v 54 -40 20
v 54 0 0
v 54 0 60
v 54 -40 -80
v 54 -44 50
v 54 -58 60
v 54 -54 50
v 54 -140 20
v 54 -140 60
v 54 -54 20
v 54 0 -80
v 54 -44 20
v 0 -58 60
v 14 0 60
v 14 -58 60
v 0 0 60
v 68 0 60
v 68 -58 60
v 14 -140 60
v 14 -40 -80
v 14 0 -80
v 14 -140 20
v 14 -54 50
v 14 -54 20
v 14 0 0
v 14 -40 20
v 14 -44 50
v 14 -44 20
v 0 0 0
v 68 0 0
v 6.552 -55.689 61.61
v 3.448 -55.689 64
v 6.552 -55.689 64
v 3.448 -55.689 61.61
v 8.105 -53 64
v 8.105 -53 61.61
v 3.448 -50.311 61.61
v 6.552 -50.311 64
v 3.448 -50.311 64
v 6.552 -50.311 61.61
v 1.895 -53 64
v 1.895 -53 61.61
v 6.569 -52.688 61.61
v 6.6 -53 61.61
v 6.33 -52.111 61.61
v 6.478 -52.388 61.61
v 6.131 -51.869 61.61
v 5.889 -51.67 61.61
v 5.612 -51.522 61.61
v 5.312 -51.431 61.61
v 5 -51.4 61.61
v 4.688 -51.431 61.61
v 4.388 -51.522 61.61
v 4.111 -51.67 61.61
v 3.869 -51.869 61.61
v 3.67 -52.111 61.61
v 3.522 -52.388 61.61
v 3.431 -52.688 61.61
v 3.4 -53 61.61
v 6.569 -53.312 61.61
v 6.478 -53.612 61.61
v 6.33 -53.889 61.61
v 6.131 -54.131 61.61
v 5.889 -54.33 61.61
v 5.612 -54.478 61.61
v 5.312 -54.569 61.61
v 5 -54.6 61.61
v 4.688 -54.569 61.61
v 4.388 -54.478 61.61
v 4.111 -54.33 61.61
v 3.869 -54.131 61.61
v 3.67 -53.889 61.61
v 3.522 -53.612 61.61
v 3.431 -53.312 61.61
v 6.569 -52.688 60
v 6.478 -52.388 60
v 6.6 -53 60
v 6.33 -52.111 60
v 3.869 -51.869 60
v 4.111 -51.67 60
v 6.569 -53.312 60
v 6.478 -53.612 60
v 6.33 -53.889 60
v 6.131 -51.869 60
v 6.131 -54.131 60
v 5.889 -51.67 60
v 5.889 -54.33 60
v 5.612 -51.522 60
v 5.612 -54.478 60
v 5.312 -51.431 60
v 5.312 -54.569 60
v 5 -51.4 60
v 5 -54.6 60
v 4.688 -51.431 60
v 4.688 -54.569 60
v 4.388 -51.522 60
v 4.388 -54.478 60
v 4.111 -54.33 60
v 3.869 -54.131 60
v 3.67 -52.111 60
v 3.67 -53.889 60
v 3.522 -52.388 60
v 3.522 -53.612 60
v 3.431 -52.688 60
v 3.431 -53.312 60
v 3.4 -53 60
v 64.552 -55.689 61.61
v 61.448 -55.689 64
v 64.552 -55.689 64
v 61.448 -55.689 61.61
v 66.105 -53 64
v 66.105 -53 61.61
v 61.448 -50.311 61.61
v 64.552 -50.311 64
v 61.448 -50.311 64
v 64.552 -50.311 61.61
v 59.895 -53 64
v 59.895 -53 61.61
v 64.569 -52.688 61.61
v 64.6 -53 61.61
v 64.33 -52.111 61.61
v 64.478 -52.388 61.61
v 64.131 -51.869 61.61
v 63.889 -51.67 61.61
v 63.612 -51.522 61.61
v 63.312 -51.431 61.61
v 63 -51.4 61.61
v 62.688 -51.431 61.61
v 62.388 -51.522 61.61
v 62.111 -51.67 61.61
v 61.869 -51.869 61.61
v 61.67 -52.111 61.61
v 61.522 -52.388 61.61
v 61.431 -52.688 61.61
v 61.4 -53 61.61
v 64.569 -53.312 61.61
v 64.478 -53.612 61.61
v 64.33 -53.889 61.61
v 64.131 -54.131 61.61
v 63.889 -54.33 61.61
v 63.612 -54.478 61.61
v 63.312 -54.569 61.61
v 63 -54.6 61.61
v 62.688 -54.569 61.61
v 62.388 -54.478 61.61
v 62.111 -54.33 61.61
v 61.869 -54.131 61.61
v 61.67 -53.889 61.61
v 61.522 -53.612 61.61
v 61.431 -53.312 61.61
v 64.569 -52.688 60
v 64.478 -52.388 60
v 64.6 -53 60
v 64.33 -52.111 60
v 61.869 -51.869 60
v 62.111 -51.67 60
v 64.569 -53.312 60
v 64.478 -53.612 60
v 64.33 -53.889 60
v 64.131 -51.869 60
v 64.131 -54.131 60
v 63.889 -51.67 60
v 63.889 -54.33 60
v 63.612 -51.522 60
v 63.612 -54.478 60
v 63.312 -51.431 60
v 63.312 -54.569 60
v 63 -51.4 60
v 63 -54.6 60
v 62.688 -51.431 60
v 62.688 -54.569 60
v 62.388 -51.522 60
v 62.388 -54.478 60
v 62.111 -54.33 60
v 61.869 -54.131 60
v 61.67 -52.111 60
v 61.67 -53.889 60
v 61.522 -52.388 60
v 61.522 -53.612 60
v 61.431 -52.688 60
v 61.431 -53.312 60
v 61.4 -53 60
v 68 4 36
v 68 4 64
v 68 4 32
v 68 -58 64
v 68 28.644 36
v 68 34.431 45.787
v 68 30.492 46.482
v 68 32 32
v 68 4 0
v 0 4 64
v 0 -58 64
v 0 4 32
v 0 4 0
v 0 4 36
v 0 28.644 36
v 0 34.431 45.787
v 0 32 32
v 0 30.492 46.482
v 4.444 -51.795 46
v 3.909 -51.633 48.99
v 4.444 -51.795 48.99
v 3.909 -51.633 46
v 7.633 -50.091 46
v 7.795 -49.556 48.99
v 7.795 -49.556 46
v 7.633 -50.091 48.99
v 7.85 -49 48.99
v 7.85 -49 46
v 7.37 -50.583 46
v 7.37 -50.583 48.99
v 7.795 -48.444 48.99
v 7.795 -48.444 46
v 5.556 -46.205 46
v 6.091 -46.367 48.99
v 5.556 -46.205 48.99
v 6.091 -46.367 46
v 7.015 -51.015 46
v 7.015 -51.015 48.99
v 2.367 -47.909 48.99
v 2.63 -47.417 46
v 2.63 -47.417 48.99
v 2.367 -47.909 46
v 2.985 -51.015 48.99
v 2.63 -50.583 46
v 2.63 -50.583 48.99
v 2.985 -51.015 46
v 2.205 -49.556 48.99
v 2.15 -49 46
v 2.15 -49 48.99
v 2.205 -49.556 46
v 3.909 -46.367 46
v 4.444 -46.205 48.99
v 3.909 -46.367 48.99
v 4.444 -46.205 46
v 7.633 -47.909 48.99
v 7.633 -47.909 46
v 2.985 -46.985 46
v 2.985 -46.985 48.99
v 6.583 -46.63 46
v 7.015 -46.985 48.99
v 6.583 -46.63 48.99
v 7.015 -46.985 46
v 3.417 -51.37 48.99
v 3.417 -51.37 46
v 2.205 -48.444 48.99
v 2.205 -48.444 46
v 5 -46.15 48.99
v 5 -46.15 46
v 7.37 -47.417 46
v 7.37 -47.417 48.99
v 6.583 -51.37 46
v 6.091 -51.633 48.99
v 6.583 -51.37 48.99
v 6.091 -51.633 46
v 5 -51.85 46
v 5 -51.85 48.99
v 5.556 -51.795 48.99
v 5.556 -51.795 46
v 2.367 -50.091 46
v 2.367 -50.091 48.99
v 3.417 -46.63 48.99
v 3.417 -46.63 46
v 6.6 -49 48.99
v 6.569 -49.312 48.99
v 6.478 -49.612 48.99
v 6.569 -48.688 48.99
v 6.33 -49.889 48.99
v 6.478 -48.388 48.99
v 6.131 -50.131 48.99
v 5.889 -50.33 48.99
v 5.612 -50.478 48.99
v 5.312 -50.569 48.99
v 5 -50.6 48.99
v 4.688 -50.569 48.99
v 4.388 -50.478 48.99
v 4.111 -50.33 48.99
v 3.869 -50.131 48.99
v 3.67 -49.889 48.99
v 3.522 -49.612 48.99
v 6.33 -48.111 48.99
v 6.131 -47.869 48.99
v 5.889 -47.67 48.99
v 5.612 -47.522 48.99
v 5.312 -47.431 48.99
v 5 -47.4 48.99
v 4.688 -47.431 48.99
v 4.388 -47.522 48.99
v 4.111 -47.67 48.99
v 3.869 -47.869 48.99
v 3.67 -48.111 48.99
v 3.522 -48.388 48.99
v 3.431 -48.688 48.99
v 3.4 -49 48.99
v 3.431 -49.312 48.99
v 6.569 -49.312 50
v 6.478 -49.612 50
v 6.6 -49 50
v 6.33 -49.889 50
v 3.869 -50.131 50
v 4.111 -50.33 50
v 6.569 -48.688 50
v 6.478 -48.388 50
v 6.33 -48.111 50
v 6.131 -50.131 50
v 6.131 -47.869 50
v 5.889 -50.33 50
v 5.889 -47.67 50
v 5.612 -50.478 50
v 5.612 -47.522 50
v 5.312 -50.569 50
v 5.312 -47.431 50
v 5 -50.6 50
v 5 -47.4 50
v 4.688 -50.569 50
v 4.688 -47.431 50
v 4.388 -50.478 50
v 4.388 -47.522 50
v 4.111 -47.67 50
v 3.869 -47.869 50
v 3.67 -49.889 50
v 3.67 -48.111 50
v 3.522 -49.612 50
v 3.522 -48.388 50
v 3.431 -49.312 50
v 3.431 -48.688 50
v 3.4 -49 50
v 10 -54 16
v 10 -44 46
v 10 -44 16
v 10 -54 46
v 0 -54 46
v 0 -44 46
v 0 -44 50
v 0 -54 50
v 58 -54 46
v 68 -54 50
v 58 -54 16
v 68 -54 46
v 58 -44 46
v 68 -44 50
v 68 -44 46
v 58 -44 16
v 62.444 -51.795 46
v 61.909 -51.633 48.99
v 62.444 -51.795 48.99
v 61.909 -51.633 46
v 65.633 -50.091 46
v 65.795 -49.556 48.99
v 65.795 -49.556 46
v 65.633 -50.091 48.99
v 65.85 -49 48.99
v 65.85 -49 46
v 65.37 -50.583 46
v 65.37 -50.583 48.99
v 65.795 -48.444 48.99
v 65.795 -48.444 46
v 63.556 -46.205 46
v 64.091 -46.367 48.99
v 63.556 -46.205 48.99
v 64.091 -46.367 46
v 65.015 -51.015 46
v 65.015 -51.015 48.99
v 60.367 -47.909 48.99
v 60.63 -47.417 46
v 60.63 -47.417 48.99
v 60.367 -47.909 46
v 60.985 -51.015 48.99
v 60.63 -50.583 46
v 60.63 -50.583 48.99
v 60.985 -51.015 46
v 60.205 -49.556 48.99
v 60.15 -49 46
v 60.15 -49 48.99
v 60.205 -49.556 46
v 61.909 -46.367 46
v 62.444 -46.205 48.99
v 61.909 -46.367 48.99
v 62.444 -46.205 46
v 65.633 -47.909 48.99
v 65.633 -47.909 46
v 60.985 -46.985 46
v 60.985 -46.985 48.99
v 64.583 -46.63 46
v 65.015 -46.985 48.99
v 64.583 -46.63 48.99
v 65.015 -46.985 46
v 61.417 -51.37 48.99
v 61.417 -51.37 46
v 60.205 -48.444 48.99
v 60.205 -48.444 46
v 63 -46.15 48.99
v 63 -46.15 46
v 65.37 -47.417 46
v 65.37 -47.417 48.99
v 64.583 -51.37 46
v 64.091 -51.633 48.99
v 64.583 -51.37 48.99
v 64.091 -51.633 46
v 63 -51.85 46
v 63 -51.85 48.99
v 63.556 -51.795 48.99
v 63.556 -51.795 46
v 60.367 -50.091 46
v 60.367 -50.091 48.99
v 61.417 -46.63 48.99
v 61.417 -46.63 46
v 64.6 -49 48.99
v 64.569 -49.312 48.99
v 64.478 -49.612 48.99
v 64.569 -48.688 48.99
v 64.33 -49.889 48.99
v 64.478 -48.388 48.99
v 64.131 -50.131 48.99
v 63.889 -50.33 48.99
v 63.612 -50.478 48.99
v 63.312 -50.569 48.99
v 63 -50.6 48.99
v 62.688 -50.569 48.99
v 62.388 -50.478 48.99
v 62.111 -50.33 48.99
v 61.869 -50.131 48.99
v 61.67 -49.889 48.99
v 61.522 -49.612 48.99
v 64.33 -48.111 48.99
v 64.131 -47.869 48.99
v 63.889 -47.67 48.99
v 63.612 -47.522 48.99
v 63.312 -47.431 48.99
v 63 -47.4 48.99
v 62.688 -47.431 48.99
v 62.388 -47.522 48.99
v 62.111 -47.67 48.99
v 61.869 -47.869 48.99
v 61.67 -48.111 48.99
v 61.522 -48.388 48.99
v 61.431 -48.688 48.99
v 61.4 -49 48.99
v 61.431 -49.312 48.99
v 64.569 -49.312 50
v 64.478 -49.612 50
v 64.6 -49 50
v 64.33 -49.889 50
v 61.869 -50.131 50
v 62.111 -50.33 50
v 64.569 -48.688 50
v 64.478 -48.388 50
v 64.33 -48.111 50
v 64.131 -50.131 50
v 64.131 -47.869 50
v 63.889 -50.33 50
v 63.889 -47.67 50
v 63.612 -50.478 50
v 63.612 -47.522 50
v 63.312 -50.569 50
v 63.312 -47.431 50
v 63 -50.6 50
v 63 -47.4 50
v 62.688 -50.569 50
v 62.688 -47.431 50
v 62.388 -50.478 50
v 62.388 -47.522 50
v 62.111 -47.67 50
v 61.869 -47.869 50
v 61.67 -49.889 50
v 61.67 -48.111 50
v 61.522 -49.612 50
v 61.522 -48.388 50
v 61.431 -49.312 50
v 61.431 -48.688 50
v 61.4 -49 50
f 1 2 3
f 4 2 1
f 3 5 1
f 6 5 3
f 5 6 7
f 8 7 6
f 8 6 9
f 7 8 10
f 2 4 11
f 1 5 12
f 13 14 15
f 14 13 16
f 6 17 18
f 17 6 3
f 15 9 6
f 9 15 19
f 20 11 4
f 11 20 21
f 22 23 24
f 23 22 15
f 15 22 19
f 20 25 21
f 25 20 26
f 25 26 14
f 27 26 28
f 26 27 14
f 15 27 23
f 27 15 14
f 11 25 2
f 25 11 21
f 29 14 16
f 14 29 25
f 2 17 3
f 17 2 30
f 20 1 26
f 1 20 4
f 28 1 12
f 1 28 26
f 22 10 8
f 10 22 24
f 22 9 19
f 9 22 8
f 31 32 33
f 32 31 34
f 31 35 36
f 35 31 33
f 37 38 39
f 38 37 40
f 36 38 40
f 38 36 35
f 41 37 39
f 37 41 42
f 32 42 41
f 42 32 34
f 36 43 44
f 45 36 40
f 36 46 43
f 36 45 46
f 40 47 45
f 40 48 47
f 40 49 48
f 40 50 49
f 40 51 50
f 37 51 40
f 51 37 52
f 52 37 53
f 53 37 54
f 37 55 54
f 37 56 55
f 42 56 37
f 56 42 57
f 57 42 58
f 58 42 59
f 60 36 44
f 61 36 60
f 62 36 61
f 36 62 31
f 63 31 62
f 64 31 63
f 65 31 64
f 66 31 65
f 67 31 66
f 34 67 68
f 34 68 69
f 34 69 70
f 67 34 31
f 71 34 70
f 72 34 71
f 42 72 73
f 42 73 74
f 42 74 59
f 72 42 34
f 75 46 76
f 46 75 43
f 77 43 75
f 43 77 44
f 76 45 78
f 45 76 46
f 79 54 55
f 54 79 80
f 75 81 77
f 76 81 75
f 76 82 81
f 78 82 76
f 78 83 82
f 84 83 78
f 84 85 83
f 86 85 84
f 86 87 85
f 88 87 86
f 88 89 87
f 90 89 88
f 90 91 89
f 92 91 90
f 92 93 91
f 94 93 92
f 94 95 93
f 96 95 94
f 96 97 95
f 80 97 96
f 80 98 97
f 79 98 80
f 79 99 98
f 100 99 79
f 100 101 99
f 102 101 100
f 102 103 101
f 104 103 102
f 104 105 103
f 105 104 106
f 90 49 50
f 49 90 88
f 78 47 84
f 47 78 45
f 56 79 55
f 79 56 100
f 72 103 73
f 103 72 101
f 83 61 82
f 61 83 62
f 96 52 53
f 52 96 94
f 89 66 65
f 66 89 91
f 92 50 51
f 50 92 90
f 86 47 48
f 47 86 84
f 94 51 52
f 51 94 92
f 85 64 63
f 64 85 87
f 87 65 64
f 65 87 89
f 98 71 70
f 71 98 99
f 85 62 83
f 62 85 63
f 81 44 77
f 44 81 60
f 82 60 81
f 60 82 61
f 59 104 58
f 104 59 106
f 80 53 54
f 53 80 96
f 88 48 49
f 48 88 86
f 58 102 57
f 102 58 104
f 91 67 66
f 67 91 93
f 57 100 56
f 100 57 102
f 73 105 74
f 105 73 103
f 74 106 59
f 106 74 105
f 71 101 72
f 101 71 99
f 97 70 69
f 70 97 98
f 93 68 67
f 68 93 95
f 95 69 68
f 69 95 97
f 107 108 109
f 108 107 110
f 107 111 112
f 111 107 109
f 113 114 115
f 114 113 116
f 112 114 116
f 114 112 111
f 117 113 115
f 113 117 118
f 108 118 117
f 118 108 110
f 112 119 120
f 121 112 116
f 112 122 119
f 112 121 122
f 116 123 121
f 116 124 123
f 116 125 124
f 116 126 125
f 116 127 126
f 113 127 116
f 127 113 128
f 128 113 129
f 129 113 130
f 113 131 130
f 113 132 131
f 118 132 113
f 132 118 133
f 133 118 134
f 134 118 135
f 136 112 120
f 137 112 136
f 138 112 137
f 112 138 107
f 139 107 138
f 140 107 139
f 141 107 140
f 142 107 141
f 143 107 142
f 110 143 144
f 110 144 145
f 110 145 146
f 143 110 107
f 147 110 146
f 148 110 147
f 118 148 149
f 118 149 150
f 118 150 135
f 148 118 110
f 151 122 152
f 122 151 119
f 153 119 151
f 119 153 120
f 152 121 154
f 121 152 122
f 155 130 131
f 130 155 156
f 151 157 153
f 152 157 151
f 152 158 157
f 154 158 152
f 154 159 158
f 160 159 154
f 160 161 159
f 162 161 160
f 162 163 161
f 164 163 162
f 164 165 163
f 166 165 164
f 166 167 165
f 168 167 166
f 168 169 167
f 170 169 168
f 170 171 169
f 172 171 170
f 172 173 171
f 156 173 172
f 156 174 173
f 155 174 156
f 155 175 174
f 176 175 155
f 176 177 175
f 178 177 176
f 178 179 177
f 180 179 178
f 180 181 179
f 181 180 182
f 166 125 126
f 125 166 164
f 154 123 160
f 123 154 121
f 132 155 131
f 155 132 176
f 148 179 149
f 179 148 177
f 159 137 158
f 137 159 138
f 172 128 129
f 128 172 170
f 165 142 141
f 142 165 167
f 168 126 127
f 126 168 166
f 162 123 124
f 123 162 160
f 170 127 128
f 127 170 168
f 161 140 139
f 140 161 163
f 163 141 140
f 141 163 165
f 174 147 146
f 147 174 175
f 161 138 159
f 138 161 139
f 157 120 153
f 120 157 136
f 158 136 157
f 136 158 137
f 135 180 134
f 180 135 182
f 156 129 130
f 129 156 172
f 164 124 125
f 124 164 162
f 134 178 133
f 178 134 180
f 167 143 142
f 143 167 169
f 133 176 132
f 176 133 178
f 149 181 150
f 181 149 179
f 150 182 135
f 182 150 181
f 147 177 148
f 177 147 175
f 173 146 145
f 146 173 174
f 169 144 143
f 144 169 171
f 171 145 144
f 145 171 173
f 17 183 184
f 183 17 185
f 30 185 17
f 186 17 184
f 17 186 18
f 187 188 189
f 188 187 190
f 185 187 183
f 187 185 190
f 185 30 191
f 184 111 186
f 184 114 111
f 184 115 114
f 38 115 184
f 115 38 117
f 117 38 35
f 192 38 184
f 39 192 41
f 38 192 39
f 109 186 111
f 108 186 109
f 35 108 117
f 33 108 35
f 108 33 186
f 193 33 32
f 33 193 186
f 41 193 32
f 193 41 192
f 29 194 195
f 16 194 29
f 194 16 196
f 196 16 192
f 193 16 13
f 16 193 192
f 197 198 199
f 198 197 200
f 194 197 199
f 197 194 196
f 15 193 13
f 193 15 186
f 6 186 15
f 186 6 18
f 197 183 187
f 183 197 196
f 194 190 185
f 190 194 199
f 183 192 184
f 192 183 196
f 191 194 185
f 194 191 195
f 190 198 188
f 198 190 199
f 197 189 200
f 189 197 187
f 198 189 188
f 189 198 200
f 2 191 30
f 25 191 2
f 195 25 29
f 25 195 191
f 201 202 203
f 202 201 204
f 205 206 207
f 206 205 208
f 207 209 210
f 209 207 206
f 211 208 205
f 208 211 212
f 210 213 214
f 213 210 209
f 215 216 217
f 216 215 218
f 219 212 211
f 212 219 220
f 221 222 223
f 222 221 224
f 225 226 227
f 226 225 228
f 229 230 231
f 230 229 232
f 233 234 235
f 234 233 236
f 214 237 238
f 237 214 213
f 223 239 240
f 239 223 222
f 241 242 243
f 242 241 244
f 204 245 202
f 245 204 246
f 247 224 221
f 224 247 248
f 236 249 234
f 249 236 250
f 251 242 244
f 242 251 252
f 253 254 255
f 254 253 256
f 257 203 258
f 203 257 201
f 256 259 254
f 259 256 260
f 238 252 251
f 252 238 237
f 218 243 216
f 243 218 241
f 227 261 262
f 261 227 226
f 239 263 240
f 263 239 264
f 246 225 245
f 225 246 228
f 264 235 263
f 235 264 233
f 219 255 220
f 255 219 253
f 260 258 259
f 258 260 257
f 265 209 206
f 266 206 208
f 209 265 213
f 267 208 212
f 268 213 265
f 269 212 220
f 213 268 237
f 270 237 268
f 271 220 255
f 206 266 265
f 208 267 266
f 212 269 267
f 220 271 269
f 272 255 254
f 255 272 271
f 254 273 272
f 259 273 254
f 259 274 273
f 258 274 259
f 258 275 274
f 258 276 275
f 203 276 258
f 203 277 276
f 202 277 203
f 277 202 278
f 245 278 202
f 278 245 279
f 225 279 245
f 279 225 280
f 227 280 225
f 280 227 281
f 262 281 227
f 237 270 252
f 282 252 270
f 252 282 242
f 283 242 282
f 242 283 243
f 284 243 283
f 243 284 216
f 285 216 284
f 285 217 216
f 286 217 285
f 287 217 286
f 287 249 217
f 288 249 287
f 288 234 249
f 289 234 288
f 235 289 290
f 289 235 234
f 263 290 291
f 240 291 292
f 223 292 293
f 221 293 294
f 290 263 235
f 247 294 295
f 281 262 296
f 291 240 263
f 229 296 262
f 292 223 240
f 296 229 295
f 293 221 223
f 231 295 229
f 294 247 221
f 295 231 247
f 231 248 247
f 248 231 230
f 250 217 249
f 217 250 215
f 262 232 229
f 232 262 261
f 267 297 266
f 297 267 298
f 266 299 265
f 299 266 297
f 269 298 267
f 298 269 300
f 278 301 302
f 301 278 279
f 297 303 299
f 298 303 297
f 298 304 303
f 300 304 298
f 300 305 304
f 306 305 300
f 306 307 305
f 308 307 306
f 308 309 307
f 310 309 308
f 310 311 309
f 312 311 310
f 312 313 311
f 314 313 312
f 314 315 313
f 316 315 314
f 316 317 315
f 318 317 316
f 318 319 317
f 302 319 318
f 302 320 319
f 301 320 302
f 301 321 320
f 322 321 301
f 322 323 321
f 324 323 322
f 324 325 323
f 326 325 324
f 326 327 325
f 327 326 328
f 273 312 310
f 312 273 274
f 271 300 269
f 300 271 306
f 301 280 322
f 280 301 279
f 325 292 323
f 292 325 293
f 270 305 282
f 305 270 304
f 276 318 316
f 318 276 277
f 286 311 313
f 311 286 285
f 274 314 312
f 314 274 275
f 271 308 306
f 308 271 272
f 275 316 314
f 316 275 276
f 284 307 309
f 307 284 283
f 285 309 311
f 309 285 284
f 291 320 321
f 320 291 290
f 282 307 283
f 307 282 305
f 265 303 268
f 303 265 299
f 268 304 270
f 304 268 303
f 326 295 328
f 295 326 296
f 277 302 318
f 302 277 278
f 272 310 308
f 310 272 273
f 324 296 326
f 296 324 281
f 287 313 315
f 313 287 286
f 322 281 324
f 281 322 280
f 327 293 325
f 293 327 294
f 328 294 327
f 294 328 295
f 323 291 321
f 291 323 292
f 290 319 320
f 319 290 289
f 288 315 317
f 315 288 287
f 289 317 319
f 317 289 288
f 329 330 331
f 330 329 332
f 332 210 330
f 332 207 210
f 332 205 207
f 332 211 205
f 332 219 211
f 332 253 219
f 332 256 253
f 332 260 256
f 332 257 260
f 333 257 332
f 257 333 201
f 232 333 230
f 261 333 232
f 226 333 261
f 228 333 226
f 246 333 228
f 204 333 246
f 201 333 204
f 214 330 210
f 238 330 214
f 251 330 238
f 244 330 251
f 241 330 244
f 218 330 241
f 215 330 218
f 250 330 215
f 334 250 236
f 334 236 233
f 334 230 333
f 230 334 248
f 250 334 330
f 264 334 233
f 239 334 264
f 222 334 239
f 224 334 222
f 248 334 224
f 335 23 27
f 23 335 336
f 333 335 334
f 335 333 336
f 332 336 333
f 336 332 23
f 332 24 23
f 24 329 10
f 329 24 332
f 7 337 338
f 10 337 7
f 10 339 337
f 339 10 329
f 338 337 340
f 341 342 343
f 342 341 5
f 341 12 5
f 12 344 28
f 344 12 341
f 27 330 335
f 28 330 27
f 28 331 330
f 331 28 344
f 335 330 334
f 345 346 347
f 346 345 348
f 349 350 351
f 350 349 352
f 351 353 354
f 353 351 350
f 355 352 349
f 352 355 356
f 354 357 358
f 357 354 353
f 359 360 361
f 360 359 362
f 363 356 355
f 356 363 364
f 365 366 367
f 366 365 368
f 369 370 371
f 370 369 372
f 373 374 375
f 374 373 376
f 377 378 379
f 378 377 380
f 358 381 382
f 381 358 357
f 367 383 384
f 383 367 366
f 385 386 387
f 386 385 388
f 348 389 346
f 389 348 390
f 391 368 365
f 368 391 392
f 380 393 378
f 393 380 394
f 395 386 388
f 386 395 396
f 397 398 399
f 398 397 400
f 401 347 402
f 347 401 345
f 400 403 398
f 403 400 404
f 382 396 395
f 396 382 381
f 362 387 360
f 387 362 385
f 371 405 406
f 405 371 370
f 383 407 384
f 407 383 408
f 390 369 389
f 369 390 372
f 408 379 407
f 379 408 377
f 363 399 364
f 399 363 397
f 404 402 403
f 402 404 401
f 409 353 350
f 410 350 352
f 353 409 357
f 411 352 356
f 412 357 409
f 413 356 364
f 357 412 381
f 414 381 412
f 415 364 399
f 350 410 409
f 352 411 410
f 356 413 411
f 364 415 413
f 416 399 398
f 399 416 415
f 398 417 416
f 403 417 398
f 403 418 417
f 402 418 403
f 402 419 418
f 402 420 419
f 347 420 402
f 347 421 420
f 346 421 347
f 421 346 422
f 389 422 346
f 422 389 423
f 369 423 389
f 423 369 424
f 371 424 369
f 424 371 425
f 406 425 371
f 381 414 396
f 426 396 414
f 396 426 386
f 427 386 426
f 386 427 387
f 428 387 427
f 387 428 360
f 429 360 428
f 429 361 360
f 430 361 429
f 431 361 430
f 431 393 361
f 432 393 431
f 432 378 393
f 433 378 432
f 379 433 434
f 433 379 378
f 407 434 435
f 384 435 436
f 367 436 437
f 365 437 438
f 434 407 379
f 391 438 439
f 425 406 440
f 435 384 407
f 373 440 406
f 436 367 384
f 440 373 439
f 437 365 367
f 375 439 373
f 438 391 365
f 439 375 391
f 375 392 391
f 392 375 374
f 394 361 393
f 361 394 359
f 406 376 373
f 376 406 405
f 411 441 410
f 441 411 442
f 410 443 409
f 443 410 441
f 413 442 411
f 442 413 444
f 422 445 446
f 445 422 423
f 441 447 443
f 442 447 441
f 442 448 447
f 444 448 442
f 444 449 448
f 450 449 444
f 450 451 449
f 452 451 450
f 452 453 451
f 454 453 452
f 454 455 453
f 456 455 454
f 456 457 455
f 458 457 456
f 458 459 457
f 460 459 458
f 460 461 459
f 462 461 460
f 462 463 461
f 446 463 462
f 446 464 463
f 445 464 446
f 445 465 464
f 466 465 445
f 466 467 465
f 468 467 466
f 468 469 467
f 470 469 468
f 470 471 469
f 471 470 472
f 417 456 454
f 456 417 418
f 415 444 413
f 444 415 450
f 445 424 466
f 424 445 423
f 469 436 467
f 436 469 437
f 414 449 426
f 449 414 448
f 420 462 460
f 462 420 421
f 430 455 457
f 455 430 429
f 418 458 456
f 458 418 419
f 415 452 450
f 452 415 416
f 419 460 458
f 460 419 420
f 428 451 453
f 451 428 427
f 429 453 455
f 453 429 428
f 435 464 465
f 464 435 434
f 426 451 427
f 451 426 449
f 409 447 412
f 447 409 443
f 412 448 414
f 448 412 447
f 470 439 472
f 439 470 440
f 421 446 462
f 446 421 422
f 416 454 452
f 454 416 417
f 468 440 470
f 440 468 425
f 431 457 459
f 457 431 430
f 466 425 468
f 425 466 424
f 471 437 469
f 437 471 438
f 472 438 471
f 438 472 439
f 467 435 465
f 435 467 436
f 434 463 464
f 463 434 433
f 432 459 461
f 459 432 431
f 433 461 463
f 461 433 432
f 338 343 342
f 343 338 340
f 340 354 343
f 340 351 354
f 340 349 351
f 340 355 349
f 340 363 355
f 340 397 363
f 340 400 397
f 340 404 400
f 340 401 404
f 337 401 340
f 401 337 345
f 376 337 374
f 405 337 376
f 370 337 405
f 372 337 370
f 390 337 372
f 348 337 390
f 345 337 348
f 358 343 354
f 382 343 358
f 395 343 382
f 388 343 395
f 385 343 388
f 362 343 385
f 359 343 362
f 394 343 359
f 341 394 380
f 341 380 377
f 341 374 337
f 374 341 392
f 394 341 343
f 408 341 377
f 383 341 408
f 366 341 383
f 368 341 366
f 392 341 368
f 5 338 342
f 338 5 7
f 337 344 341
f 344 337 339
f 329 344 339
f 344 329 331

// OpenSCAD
// file: ../common/din/base.scad
DIN_TOLERANCE = 0.1;

module din_help(name, _STD_TABLE) {
    echo("-----------------------------");
    echo(str("Size indexes for ", name));
    for(idx=[0:len(_STD_TABLE)-1]) {
        echo(str(idx, " = M", _STD_TABLE[idx][0]));
    }
    echo("-----------------------------");
}

module din_cutout_base(inner, outer, cap_height, height, fn) {
    translate([0, 0, height]) {
        mirror([0, 0, 1]) {
            cylinder(r=outer/2 + DIN_TOLERANCE, h=cap_height, center=false, $fn = fn);
            cylinder(r=inner/2 + DIN_TOLERANCE, h=height, center=false, $fn = 32);
        }
    }
}

module hex_nut(inner, outer, cap_height, height = 0) {
    din_cutout_base(inner, outer, cap_height, height, 6);
}

module round_bolt(inner, outer, cap_height, height = 0) {
    din_cutout_base(inner, outer, cap_height, height, 32);
}

translate([-10, 0, 0]) round_bolt(inner = 3, outer = 6.01, cap_height = 2.4, height = 10);
translate([10, 0, 0]) hex_nut(inner = 3, outer = 6.01, cap_height = 2.4, height = 10);
// file: ../common/din/din912.scad
use <./base.scad>
/*
    format: [size, diameter, cap_height]
            [d1, d2, k]
*/
_DIN_912_STD = [[2,3.8,2],[3,5.5,3],[4,7,4],[5,8.5,5],[6,10,6],[8,13,8],[10,16,10],[12,18,12],[14,21,14],[16,24,16],[18,27,18],[20,30,20],[24,36,24],[27,40,27],[30,45,30],[36,54,36]];

module din912_help() {
    din_help("DIN 912", _DIN_912_STD);
}

module din912_base(m_idx, height) {
    row = _DIN_912_STD[m_idx];
    inner = row[0];
    outer = row[1];
    cap_height = row[2];
    round_bolt(inner, outer, cap_height, height);
}

module din912(m_idx, height, coords) {
    difference() {
        children();
        for(i=[0:len(coords) - 1]) {
            translate([coords[i][0], coords[i][1], 0])
                din912_base(m_idx, height);
        }
    }
}

/* din912_help(); */

/*
din912(1, 10, [[5, 5]]) {
    cube([10, 10, 10]);
}
*/
// file: ../common/din/din934.scad
use <./base.scad>
/*
    format: [size, diameter, cap_height]
            [d1, e, m]
*/
_DIN_934_STD = [[1,2.72,0.8],[1.2,3.29,1],[1.4,3.29,1.2],[1.6,3.48,1.3],[1.7,3.82,1.4],[2,4.32,1.6],[2.3,4.95,1.8],[2.5,5.45,2],[2.6,5.51,2],[3,6.01,2.4],[3.5,6.01,2.8],[4,7.66,3.2],[5,8.76,4],[6,11.05,5],[7,12.12,5.5],[8,14.38,6.5],[10,18.9,8],[12,21.1,10],[14,24.49,11],[16,26.75,13],[18,29.56,15],[20,32.95,16],[22,35.03,18],[24,39.55,19],[27,45.2,22],[30,50.85,24],[33,55.37,26],[36,60.79,29],[39,66.44,31],[42,71.3,34],[45,76.95,36],[48,82.6,38],[52,88.25,42],[56,95.07,45],[60,100.72,48],[64,106.37,51],[68,112.02,54],[72,117.67,58],[76,123.32,61],[80,128.97,64],[85,133.11,68],[90,145.77,72],[95,151.42,76],[100,162.72,80],[105,16837,84],[110,174.02,88],[115,185.32,92],[120,190.97,96],[125,202.27,100],[130,207.75,104],[135,213.4,108],[140,224.7,112],[145,236,116],[150,236,120]];

module din934_help() {
    din_help("DIN 934", _DIN_934_STD);
}

module din934_base(m_idx, height) {
    row = _DIN_934_STD[m_idx];
    inner = row[0];
    outer = row[1];
    cap_height = row[2];
    hex_nut(inner, outer, cap_height, height);
}

module din934(m_idx, height, coords) {
    difference() {
        children();
        for(i=[0:len(coords) - 1]) {
            translate([coords[i][0], coords[i][1], 0])
                din934_base(m_idx, height);
        }
    }
}

/* din934_help(); */

/*
din934(9, 10, [[5, 5]]) {
    cube([10, 10, 10]);
}
*/
// main file
include <../common/din/din934.scad>
include <../common/din/din912.scad>


leg_side = 40;
front_height = 60;
joint_height = 10;
thickness = 4;
ear_size = 10;

bolt_height = 10;

headphones_joint_size = 28;

tolerance = 0.1;

module mock() {
    color(c = [1, 0, 0], alpha = 0.3) {
        union() {
            translate([0, 0, -100]) cube([leg_side, leg_side, 100 + leg_side]);
            translate([0, -100, 0]) cube([leg_side, 100, leg_side]);
        }
    }
}

module ear() {
    translate([0, 0, 0])
        rotate([-90, 0, 0])
            din912(1, thickness + 0.01, [[5, 5]])
                cube([ear_size, joint_height, thickness]);
}

module hook() {
    translate([0, thickness, 0])
        cube([leg_side + ear_size * 2 + thickness * 2, headphones_joint_size, thickness]);

    translate([0, headphones_joint_size + thickness, 0])
        rotate([80, 0, 0])
            cube([leg_side + ear_size * 2 + thickness * 2, headphones_joint_size * 0.5, thickness]);
}

module front_part() {
    union() {
        translate([0, 0, 0])
            cube([leg_side + ear_size * 2 + thickness * 2, thickness, front_height + thickness]);

        translate([0, -leg_side - ear_size - thickness * 2, front_height])
            din934(9, thickness + 0.01, [[5, 5], [leg_side + ear_size + thickness * 2 + 5, 5]])
                cube([leg_side + ear_size * 2 + thickness * 2, leg_side + ear_size + thickness * 2, thickness]);

        translate([0, 0, front_height - headphones_joint_size])
            hook();

    }
}

module back_part() {
    translate([0, - leg_side - thickness, front_height - bolt_height])
        rotate([-90, 0, 0])
                ear();

    translate([leg_side + thickness * 2 + ear_size, - leg_side - thickness, front_height - bolt_height])
        rotate([-90, 0, 0])
                ear();

    translate([ear_size,  - leg_side - joint_height - thickness, front_height - leg_side - thickness]) {
        difference() {
            cube([leg_side + thickness * 2, joint_height, leg_side - bolt_height + thickness]);
            translate([thickness, 0, thickness])
                cube([leg_side, joint_height, leg_side - bolt_height + thickness]);
        }
    }
}

translate([ear_size + thickness, -leg_side, front_height - leg_side]) mock();

color(c = [0, 1, 0])
    front_part();

back_part();
